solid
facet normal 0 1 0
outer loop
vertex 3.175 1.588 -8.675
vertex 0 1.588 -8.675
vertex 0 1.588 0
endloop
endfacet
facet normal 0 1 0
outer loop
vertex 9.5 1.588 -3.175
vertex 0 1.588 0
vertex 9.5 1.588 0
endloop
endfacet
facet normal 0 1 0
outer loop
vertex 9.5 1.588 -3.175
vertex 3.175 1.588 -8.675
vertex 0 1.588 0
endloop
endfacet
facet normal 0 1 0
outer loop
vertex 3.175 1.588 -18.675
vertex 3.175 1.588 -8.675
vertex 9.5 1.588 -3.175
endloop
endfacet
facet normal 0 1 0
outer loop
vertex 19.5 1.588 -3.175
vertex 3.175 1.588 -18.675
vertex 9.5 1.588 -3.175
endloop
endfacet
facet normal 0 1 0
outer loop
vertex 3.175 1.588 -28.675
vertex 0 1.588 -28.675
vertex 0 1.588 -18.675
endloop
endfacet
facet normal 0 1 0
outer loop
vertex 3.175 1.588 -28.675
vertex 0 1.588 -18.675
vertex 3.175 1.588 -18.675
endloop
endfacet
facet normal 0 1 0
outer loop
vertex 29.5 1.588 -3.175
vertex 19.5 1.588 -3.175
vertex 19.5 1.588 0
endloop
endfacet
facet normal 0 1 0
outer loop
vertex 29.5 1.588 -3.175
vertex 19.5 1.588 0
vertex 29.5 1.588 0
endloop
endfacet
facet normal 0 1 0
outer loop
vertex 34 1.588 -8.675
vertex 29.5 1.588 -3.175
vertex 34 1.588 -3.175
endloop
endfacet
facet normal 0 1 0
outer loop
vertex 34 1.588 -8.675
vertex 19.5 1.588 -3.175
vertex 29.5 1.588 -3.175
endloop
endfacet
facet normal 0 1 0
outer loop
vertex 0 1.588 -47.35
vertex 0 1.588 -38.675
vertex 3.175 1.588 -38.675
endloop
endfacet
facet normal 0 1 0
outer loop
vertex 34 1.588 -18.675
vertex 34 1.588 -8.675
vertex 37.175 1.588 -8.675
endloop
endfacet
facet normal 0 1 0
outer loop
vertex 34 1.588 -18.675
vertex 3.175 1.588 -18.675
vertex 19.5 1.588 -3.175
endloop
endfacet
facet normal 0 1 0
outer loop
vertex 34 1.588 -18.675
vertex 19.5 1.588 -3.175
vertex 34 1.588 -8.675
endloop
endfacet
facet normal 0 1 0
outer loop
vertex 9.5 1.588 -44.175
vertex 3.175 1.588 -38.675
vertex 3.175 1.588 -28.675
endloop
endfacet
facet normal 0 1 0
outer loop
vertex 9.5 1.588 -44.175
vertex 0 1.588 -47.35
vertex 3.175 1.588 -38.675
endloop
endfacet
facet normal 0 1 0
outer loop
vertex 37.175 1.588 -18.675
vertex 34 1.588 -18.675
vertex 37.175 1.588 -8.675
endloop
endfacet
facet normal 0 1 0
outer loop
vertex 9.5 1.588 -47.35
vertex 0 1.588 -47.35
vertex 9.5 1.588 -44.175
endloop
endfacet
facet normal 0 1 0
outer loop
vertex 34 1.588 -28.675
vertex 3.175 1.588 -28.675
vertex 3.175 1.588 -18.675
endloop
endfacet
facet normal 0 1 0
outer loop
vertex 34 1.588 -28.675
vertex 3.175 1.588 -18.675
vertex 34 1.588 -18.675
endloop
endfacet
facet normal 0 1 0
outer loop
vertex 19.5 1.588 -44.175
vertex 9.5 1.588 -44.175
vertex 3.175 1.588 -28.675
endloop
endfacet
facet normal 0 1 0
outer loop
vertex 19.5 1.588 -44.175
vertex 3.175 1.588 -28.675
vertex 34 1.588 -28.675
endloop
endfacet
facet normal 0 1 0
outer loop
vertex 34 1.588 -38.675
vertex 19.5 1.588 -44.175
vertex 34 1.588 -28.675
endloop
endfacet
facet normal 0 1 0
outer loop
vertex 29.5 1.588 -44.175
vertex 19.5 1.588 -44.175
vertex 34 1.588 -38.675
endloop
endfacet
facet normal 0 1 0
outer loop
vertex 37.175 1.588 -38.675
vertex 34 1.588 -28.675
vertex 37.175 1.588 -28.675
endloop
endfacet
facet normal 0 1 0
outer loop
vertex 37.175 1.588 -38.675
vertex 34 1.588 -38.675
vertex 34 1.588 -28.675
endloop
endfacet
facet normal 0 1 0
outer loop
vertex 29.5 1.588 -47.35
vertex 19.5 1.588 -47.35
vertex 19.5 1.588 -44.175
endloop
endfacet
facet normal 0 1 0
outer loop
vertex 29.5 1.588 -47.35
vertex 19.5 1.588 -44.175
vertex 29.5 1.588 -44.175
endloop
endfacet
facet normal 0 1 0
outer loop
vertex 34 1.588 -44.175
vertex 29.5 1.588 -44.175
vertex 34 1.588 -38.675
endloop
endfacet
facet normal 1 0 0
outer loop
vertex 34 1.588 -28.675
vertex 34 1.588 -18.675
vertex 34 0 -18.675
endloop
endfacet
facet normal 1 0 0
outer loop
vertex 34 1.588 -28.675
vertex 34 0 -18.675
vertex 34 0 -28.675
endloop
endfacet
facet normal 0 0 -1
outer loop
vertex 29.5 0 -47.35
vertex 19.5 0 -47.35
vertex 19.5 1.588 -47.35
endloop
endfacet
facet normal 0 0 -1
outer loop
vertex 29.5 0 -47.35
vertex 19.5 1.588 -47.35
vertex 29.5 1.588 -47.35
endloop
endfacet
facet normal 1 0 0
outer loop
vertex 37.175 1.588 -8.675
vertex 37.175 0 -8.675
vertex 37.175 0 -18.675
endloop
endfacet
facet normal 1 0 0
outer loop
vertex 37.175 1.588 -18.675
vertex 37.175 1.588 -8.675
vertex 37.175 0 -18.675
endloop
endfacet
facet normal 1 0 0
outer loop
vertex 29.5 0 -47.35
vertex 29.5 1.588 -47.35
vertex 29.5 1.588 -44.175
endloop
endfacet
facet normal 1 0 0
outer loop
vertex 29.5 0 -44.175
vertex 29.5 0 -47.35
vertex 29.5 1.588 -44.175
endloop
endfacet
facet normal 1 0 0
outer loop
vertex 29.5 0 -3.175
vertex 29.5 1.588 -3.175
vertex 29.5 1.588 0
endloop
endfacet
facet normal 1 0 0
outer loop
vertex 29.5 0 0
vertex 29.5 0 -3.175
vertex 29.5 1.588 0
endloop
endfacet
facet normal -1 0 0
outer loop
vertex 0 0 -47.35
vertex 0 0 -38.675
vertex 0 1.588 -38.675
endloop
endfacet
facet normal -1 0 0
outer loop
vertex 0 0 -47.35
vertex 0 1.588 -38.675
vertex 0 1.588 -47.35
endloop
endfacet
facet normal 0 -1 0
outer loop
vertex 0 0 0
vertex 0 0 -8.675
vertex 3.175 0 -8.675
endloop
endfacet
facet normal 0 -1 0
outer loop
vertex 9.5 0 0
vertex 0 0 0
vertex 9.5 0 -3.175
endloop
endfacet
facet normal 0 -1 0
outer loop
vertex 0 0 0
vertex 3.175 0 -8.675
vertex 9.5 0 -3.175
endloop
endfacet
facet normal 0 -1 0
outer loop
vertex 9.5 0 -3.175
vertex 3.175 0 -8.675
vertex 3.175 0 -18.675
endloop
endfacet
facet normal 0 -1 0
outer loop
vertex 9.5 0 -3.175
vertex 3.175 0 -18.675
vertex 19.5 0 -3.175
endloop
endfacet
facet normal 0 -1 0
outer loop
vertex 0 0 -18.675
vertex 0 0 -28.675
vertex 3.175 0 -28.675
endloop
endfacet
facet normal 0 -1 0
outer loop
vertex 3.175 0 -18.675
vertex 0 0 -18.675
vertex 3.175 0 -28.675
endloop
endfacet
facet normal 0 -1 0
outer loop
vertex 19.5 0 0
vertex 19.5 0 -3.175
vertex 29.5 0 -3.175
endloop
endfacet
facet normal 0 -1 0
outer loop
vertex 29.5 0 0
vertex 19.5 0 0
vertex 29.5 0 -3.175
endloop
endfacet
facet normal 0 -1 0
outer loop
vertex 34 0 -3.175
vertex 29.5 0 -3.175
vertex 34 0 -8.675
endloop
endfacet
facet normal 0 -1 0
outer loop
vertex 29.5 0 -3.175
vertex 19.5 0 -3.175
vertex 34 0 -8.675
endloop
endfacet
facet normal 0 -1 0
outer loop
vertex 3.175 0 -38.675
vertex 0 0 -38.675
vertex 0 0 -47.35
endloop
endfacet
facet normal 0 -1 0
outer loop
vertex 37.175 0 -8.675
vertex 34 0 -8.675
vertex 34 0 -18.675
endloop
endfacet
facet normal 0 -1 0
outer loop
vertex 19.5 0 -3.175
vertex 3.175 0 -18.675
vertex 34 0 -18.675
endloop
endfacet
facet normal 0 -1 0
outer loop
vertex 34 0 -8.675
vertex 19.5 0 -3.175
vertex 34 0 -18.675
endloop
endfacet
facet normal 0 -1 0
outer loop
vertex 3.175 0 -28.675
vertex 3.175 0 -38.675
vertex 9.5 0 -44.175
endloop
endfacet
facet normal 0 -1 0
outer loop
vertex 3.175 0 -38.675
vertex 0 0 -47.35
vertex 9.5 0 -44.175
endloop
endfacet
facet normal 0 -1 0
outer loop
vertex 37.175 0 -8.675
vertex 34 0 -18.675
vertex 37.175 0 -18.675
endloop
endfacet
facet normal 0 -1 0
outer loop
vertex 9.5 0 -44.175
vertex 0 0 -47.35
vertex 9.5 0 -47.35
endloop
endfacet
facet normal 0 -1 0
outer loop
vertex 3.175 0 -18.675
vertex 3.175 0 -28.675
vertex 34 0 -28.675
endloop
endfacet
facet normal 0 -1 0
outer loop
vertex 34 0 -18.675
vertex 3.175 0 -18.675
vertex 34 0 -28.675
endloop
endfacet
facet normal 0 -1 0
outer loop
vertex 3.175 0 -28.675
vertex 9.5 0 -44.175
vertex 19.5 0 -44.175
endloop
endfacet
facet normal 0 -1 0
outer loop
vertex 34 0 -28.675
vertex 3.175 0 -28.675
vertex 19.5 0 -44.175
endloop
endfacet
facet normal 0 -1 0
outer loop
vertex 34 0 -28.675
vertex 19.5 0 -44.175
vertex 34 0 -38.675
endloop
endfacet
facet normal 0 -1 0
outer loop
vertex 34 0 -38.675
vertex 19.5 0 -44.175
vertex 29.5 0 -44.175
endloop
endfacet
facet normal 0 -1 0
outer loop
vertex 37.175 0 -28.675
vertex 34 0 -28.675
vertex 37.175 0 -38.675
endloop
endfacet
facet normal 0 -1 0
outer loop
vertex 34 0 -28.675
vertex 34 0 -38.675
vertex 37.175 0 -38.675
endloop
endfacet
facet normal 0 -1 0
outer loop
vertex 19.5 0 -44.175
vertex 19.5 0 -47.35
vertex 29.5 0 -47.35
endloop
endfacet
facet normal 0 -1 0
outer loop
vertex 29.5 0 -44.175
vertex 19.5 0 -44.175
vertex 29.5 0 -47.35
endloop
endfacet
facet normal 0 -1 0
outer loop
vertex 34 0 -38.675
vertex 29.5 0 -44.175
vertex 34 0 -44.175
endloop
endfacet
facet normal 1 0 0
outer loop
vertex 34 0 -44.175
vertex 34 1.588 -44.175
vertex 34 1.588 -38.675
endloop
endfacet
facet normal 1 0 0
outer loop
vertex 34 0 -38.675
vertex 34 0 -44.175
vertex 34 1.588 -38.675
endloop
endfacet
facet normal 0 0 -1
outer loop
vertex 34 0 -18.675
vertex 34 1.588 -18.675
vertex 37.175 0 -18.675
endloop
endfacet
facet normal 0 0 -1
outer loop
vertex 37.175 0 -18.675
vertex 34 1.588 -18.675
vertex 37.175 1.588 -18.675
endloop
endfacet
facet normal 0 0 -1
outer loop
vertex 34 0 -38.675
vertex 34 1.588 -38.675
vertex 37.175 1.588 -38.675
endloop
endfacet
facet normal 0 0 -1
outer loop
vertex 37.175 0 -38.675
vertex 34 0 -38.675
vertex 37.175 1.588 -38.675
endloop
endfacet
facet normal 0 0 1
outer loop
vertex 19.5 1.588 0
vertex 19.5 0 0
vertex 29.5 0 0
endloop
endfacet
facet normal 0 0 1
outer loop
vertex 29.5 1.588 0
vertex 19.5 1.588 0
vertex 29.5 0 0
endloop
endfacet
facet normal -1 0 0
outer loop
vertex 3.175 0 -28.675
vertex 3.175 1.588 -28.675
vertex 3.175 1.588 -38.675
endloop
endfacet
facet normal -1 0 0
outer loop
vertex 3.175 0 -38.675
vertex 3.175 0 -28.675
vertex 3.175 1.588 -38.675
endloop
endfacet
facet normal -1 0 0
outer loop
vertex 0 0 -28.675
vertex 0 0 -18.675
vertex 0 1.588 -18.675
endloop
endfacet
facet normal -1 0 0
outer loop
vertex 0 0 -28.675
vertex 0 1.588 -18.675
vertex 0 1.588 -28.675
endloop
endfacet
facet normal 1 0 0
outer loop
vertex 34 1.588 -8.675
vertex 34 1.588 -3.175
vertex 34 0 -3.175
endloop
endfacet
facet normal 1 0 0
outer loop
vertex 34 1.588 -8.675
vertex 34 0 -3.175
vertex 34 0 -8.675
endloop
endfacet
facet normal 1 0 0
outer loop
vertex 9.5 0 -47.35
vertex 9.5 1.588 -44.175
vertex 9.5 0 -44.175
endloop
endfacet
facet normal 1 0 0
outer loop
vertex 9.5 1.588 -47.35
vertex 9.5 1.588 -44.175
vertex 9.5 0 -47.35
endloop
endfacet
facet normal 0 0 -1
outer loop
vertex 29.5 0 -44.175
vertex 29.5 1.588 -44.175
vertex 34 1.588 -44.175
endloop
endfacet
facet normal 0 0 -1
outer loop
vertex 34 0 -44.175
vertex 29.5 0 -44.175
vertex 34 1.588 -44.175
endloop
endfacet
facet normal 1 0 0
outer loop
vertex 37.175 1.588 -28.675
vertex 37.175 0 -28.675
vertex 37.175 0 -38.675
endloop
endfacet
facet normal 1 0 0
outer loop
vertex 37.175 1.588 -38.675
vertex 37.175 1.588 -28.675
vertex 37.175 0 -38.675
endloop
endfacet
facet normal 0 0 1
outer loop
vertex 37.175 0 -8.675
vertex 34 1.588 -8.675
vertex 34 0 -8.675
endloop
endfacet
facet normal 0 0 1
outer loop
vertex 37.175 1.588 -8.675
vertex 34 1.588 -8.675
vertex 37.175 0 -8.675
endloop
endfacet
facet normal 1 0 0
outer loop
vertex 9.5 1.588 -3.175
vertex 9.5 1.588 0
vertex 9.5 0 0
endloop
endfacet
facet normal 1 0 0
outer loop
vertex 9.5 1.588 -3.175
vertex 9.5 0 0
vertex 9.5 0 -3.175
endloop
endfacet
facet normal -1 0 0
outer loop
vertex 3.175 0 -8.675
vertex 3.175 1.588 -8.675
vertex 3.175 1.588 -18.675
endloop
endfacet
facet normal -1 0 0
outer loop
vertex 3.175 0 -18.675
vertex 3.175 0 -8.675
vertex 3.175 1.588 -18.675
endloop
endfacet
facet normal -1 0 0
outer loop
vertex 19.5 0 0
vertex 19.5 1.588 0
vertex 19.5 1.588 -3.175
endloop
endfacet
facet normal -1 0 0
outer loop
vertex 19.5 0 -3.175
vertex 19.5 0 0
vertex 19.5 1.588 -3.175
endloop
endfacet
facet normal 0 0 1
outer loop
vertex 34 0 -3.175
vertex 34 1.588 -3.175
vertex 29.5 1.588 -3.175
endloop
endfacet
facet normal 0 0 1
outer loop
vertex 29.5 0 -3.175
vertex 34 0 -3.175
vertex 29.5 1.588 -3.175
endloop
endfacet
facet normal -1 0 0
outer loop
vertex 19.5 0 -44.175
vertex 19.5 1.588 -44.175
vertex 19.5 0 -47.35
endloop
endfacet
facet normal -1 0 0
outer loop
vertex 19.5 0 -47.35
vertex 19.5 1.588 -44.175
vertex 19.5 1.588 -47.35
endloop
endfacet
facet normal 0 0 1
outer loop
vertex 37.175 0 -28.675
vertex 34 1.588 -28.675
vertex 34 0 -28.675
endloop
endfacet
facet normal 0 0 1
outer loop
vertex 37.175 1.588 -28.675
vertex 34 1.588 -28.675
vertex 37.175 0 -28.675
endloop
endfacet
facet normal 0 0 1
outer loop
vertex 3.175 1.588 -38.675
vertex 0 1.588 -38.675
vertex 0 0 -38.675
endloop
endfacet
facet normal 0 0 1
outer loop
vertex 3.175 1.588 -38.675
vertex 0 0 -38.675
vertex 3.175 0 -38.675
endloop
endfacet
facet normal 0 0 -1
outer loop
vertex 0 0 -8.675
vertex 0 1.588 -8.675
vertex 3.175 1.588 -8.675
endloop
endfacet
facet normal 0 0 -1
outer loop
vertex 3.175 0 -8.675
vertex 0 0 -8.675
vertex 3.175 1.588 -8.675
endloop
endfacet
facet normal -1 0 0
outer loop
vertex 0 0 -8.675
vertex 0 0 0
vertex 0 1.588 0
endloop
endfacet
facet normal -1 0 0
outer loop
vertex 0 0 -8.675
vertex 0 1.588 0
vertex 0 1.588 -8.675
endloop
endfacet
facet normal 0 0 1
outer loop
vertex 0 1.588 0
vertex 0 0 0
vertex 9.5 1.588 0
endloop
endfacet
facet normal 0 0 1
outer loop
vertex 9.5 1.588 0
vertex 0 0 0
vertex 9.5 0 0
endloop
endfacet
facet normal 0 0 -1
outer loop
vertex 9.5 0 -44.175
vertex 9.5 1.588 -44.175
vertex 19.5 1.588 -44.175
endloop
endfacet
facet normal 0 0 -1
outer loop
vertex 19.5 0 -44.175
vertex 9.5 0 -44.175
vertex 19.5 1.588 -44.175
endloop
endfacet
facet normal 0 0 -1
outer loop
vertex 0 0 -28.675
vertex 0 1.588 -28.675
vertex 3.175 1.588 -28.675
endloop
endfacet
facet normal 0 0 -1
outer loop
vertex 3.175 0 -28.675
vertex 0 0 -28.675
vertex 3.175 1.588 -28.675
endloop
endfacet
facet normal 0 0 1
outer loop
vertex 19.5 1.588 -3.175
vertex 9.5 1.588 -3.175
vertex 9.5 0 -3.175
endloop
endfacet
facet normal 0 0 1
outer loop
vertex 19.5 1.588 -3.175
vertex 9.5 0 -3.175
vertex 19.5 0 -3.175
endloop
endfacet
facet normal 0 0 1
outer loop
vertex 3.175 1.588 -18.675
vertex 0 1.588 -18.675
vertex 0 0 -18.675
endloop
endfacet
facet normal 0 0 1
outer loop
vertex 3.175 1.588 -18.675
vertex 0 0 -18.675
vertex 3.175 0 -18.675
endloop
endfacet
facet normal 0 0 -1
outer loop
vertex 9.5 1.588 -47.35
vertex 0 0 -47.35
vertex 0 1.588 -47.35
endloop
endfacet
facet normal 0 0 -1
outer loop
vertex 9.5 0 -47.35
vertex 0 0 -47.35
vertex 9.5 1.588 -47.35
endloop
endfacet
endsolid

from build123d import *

# Parameters (mm, degrees)
SKETCH1_W           = 37.175
SKETCH1_H           = 47.35
BOSS_EXTRUDE1_DEPTH = 1.5875
SKETCH2_W           = 3.175
SKETCH2_H           = 10
SKETCH2_H_2         = 5.5
SKETCH2_W_2         = 10
SKETCH2_H_3         = 3.175
CUT_EXTRUDE1_DEPTH  = 2.5875


with BuildPart() as part:
    # Sketch1 → Boss-Extrude1 (new body)
    with BuildSketch(Plane(origin=(0, 0, 0), x_dir=(1, 0, 0), z_dir=(0, 1, 0))):
        with Locations((18.5875, 23.675)):
            Rectangle(SKETCH1_W, SKETCH1_H)
    extrude(amount=BOSS_EXTRUDE1_DEPTH)

    # Sketch2 → Cut-Extrude1 (cut, through all)
    with BuildSketch(Plane(origin=(0, 1.5875, 0), x_dir=(1, 0, 0), z_dir=(0, 1, 0))):
        Polygon((37.175, 47.35), (29.5, 47.35), (29.5, 44.175), (34, 44.175), (34, 38.675), (37.175, 38.675), align=None)
        with Locations((35.5875, 23.675)):
            Rectangle(SKETCH2_W, SKETCH2_H)
        Polygon((29.5, 3.175), (29.5, 0), (37.175, 0), (37.175, 3.175), (34, 3.175), align=None)
        with Locations((35.5875, 5.925)):
            Rectangle(SKETCH2_W, SKETCH2_H_2)
        with Locations((14.5, 1.5875)):
            Rectangle(SKETCH2_W_2, SKETCH2_H_3)
        with Locations((1.5875, 13.675)):
            Rectangle(SKETCH2_W, SKETCH2_H)
        with Locations((1.5875, 33.675)):
            Rectangle(SKETCH2_W, SKETCH2_H)
        with Locations((14.5, 45.7625)):
            Rectangle(SKETCH2_W_2, SKETCH2_H_3)
    extrude(amount=-CUT_EXTRUDE1_DEPTH, mode=Mode.SUBTRACT)


solid = part.part
